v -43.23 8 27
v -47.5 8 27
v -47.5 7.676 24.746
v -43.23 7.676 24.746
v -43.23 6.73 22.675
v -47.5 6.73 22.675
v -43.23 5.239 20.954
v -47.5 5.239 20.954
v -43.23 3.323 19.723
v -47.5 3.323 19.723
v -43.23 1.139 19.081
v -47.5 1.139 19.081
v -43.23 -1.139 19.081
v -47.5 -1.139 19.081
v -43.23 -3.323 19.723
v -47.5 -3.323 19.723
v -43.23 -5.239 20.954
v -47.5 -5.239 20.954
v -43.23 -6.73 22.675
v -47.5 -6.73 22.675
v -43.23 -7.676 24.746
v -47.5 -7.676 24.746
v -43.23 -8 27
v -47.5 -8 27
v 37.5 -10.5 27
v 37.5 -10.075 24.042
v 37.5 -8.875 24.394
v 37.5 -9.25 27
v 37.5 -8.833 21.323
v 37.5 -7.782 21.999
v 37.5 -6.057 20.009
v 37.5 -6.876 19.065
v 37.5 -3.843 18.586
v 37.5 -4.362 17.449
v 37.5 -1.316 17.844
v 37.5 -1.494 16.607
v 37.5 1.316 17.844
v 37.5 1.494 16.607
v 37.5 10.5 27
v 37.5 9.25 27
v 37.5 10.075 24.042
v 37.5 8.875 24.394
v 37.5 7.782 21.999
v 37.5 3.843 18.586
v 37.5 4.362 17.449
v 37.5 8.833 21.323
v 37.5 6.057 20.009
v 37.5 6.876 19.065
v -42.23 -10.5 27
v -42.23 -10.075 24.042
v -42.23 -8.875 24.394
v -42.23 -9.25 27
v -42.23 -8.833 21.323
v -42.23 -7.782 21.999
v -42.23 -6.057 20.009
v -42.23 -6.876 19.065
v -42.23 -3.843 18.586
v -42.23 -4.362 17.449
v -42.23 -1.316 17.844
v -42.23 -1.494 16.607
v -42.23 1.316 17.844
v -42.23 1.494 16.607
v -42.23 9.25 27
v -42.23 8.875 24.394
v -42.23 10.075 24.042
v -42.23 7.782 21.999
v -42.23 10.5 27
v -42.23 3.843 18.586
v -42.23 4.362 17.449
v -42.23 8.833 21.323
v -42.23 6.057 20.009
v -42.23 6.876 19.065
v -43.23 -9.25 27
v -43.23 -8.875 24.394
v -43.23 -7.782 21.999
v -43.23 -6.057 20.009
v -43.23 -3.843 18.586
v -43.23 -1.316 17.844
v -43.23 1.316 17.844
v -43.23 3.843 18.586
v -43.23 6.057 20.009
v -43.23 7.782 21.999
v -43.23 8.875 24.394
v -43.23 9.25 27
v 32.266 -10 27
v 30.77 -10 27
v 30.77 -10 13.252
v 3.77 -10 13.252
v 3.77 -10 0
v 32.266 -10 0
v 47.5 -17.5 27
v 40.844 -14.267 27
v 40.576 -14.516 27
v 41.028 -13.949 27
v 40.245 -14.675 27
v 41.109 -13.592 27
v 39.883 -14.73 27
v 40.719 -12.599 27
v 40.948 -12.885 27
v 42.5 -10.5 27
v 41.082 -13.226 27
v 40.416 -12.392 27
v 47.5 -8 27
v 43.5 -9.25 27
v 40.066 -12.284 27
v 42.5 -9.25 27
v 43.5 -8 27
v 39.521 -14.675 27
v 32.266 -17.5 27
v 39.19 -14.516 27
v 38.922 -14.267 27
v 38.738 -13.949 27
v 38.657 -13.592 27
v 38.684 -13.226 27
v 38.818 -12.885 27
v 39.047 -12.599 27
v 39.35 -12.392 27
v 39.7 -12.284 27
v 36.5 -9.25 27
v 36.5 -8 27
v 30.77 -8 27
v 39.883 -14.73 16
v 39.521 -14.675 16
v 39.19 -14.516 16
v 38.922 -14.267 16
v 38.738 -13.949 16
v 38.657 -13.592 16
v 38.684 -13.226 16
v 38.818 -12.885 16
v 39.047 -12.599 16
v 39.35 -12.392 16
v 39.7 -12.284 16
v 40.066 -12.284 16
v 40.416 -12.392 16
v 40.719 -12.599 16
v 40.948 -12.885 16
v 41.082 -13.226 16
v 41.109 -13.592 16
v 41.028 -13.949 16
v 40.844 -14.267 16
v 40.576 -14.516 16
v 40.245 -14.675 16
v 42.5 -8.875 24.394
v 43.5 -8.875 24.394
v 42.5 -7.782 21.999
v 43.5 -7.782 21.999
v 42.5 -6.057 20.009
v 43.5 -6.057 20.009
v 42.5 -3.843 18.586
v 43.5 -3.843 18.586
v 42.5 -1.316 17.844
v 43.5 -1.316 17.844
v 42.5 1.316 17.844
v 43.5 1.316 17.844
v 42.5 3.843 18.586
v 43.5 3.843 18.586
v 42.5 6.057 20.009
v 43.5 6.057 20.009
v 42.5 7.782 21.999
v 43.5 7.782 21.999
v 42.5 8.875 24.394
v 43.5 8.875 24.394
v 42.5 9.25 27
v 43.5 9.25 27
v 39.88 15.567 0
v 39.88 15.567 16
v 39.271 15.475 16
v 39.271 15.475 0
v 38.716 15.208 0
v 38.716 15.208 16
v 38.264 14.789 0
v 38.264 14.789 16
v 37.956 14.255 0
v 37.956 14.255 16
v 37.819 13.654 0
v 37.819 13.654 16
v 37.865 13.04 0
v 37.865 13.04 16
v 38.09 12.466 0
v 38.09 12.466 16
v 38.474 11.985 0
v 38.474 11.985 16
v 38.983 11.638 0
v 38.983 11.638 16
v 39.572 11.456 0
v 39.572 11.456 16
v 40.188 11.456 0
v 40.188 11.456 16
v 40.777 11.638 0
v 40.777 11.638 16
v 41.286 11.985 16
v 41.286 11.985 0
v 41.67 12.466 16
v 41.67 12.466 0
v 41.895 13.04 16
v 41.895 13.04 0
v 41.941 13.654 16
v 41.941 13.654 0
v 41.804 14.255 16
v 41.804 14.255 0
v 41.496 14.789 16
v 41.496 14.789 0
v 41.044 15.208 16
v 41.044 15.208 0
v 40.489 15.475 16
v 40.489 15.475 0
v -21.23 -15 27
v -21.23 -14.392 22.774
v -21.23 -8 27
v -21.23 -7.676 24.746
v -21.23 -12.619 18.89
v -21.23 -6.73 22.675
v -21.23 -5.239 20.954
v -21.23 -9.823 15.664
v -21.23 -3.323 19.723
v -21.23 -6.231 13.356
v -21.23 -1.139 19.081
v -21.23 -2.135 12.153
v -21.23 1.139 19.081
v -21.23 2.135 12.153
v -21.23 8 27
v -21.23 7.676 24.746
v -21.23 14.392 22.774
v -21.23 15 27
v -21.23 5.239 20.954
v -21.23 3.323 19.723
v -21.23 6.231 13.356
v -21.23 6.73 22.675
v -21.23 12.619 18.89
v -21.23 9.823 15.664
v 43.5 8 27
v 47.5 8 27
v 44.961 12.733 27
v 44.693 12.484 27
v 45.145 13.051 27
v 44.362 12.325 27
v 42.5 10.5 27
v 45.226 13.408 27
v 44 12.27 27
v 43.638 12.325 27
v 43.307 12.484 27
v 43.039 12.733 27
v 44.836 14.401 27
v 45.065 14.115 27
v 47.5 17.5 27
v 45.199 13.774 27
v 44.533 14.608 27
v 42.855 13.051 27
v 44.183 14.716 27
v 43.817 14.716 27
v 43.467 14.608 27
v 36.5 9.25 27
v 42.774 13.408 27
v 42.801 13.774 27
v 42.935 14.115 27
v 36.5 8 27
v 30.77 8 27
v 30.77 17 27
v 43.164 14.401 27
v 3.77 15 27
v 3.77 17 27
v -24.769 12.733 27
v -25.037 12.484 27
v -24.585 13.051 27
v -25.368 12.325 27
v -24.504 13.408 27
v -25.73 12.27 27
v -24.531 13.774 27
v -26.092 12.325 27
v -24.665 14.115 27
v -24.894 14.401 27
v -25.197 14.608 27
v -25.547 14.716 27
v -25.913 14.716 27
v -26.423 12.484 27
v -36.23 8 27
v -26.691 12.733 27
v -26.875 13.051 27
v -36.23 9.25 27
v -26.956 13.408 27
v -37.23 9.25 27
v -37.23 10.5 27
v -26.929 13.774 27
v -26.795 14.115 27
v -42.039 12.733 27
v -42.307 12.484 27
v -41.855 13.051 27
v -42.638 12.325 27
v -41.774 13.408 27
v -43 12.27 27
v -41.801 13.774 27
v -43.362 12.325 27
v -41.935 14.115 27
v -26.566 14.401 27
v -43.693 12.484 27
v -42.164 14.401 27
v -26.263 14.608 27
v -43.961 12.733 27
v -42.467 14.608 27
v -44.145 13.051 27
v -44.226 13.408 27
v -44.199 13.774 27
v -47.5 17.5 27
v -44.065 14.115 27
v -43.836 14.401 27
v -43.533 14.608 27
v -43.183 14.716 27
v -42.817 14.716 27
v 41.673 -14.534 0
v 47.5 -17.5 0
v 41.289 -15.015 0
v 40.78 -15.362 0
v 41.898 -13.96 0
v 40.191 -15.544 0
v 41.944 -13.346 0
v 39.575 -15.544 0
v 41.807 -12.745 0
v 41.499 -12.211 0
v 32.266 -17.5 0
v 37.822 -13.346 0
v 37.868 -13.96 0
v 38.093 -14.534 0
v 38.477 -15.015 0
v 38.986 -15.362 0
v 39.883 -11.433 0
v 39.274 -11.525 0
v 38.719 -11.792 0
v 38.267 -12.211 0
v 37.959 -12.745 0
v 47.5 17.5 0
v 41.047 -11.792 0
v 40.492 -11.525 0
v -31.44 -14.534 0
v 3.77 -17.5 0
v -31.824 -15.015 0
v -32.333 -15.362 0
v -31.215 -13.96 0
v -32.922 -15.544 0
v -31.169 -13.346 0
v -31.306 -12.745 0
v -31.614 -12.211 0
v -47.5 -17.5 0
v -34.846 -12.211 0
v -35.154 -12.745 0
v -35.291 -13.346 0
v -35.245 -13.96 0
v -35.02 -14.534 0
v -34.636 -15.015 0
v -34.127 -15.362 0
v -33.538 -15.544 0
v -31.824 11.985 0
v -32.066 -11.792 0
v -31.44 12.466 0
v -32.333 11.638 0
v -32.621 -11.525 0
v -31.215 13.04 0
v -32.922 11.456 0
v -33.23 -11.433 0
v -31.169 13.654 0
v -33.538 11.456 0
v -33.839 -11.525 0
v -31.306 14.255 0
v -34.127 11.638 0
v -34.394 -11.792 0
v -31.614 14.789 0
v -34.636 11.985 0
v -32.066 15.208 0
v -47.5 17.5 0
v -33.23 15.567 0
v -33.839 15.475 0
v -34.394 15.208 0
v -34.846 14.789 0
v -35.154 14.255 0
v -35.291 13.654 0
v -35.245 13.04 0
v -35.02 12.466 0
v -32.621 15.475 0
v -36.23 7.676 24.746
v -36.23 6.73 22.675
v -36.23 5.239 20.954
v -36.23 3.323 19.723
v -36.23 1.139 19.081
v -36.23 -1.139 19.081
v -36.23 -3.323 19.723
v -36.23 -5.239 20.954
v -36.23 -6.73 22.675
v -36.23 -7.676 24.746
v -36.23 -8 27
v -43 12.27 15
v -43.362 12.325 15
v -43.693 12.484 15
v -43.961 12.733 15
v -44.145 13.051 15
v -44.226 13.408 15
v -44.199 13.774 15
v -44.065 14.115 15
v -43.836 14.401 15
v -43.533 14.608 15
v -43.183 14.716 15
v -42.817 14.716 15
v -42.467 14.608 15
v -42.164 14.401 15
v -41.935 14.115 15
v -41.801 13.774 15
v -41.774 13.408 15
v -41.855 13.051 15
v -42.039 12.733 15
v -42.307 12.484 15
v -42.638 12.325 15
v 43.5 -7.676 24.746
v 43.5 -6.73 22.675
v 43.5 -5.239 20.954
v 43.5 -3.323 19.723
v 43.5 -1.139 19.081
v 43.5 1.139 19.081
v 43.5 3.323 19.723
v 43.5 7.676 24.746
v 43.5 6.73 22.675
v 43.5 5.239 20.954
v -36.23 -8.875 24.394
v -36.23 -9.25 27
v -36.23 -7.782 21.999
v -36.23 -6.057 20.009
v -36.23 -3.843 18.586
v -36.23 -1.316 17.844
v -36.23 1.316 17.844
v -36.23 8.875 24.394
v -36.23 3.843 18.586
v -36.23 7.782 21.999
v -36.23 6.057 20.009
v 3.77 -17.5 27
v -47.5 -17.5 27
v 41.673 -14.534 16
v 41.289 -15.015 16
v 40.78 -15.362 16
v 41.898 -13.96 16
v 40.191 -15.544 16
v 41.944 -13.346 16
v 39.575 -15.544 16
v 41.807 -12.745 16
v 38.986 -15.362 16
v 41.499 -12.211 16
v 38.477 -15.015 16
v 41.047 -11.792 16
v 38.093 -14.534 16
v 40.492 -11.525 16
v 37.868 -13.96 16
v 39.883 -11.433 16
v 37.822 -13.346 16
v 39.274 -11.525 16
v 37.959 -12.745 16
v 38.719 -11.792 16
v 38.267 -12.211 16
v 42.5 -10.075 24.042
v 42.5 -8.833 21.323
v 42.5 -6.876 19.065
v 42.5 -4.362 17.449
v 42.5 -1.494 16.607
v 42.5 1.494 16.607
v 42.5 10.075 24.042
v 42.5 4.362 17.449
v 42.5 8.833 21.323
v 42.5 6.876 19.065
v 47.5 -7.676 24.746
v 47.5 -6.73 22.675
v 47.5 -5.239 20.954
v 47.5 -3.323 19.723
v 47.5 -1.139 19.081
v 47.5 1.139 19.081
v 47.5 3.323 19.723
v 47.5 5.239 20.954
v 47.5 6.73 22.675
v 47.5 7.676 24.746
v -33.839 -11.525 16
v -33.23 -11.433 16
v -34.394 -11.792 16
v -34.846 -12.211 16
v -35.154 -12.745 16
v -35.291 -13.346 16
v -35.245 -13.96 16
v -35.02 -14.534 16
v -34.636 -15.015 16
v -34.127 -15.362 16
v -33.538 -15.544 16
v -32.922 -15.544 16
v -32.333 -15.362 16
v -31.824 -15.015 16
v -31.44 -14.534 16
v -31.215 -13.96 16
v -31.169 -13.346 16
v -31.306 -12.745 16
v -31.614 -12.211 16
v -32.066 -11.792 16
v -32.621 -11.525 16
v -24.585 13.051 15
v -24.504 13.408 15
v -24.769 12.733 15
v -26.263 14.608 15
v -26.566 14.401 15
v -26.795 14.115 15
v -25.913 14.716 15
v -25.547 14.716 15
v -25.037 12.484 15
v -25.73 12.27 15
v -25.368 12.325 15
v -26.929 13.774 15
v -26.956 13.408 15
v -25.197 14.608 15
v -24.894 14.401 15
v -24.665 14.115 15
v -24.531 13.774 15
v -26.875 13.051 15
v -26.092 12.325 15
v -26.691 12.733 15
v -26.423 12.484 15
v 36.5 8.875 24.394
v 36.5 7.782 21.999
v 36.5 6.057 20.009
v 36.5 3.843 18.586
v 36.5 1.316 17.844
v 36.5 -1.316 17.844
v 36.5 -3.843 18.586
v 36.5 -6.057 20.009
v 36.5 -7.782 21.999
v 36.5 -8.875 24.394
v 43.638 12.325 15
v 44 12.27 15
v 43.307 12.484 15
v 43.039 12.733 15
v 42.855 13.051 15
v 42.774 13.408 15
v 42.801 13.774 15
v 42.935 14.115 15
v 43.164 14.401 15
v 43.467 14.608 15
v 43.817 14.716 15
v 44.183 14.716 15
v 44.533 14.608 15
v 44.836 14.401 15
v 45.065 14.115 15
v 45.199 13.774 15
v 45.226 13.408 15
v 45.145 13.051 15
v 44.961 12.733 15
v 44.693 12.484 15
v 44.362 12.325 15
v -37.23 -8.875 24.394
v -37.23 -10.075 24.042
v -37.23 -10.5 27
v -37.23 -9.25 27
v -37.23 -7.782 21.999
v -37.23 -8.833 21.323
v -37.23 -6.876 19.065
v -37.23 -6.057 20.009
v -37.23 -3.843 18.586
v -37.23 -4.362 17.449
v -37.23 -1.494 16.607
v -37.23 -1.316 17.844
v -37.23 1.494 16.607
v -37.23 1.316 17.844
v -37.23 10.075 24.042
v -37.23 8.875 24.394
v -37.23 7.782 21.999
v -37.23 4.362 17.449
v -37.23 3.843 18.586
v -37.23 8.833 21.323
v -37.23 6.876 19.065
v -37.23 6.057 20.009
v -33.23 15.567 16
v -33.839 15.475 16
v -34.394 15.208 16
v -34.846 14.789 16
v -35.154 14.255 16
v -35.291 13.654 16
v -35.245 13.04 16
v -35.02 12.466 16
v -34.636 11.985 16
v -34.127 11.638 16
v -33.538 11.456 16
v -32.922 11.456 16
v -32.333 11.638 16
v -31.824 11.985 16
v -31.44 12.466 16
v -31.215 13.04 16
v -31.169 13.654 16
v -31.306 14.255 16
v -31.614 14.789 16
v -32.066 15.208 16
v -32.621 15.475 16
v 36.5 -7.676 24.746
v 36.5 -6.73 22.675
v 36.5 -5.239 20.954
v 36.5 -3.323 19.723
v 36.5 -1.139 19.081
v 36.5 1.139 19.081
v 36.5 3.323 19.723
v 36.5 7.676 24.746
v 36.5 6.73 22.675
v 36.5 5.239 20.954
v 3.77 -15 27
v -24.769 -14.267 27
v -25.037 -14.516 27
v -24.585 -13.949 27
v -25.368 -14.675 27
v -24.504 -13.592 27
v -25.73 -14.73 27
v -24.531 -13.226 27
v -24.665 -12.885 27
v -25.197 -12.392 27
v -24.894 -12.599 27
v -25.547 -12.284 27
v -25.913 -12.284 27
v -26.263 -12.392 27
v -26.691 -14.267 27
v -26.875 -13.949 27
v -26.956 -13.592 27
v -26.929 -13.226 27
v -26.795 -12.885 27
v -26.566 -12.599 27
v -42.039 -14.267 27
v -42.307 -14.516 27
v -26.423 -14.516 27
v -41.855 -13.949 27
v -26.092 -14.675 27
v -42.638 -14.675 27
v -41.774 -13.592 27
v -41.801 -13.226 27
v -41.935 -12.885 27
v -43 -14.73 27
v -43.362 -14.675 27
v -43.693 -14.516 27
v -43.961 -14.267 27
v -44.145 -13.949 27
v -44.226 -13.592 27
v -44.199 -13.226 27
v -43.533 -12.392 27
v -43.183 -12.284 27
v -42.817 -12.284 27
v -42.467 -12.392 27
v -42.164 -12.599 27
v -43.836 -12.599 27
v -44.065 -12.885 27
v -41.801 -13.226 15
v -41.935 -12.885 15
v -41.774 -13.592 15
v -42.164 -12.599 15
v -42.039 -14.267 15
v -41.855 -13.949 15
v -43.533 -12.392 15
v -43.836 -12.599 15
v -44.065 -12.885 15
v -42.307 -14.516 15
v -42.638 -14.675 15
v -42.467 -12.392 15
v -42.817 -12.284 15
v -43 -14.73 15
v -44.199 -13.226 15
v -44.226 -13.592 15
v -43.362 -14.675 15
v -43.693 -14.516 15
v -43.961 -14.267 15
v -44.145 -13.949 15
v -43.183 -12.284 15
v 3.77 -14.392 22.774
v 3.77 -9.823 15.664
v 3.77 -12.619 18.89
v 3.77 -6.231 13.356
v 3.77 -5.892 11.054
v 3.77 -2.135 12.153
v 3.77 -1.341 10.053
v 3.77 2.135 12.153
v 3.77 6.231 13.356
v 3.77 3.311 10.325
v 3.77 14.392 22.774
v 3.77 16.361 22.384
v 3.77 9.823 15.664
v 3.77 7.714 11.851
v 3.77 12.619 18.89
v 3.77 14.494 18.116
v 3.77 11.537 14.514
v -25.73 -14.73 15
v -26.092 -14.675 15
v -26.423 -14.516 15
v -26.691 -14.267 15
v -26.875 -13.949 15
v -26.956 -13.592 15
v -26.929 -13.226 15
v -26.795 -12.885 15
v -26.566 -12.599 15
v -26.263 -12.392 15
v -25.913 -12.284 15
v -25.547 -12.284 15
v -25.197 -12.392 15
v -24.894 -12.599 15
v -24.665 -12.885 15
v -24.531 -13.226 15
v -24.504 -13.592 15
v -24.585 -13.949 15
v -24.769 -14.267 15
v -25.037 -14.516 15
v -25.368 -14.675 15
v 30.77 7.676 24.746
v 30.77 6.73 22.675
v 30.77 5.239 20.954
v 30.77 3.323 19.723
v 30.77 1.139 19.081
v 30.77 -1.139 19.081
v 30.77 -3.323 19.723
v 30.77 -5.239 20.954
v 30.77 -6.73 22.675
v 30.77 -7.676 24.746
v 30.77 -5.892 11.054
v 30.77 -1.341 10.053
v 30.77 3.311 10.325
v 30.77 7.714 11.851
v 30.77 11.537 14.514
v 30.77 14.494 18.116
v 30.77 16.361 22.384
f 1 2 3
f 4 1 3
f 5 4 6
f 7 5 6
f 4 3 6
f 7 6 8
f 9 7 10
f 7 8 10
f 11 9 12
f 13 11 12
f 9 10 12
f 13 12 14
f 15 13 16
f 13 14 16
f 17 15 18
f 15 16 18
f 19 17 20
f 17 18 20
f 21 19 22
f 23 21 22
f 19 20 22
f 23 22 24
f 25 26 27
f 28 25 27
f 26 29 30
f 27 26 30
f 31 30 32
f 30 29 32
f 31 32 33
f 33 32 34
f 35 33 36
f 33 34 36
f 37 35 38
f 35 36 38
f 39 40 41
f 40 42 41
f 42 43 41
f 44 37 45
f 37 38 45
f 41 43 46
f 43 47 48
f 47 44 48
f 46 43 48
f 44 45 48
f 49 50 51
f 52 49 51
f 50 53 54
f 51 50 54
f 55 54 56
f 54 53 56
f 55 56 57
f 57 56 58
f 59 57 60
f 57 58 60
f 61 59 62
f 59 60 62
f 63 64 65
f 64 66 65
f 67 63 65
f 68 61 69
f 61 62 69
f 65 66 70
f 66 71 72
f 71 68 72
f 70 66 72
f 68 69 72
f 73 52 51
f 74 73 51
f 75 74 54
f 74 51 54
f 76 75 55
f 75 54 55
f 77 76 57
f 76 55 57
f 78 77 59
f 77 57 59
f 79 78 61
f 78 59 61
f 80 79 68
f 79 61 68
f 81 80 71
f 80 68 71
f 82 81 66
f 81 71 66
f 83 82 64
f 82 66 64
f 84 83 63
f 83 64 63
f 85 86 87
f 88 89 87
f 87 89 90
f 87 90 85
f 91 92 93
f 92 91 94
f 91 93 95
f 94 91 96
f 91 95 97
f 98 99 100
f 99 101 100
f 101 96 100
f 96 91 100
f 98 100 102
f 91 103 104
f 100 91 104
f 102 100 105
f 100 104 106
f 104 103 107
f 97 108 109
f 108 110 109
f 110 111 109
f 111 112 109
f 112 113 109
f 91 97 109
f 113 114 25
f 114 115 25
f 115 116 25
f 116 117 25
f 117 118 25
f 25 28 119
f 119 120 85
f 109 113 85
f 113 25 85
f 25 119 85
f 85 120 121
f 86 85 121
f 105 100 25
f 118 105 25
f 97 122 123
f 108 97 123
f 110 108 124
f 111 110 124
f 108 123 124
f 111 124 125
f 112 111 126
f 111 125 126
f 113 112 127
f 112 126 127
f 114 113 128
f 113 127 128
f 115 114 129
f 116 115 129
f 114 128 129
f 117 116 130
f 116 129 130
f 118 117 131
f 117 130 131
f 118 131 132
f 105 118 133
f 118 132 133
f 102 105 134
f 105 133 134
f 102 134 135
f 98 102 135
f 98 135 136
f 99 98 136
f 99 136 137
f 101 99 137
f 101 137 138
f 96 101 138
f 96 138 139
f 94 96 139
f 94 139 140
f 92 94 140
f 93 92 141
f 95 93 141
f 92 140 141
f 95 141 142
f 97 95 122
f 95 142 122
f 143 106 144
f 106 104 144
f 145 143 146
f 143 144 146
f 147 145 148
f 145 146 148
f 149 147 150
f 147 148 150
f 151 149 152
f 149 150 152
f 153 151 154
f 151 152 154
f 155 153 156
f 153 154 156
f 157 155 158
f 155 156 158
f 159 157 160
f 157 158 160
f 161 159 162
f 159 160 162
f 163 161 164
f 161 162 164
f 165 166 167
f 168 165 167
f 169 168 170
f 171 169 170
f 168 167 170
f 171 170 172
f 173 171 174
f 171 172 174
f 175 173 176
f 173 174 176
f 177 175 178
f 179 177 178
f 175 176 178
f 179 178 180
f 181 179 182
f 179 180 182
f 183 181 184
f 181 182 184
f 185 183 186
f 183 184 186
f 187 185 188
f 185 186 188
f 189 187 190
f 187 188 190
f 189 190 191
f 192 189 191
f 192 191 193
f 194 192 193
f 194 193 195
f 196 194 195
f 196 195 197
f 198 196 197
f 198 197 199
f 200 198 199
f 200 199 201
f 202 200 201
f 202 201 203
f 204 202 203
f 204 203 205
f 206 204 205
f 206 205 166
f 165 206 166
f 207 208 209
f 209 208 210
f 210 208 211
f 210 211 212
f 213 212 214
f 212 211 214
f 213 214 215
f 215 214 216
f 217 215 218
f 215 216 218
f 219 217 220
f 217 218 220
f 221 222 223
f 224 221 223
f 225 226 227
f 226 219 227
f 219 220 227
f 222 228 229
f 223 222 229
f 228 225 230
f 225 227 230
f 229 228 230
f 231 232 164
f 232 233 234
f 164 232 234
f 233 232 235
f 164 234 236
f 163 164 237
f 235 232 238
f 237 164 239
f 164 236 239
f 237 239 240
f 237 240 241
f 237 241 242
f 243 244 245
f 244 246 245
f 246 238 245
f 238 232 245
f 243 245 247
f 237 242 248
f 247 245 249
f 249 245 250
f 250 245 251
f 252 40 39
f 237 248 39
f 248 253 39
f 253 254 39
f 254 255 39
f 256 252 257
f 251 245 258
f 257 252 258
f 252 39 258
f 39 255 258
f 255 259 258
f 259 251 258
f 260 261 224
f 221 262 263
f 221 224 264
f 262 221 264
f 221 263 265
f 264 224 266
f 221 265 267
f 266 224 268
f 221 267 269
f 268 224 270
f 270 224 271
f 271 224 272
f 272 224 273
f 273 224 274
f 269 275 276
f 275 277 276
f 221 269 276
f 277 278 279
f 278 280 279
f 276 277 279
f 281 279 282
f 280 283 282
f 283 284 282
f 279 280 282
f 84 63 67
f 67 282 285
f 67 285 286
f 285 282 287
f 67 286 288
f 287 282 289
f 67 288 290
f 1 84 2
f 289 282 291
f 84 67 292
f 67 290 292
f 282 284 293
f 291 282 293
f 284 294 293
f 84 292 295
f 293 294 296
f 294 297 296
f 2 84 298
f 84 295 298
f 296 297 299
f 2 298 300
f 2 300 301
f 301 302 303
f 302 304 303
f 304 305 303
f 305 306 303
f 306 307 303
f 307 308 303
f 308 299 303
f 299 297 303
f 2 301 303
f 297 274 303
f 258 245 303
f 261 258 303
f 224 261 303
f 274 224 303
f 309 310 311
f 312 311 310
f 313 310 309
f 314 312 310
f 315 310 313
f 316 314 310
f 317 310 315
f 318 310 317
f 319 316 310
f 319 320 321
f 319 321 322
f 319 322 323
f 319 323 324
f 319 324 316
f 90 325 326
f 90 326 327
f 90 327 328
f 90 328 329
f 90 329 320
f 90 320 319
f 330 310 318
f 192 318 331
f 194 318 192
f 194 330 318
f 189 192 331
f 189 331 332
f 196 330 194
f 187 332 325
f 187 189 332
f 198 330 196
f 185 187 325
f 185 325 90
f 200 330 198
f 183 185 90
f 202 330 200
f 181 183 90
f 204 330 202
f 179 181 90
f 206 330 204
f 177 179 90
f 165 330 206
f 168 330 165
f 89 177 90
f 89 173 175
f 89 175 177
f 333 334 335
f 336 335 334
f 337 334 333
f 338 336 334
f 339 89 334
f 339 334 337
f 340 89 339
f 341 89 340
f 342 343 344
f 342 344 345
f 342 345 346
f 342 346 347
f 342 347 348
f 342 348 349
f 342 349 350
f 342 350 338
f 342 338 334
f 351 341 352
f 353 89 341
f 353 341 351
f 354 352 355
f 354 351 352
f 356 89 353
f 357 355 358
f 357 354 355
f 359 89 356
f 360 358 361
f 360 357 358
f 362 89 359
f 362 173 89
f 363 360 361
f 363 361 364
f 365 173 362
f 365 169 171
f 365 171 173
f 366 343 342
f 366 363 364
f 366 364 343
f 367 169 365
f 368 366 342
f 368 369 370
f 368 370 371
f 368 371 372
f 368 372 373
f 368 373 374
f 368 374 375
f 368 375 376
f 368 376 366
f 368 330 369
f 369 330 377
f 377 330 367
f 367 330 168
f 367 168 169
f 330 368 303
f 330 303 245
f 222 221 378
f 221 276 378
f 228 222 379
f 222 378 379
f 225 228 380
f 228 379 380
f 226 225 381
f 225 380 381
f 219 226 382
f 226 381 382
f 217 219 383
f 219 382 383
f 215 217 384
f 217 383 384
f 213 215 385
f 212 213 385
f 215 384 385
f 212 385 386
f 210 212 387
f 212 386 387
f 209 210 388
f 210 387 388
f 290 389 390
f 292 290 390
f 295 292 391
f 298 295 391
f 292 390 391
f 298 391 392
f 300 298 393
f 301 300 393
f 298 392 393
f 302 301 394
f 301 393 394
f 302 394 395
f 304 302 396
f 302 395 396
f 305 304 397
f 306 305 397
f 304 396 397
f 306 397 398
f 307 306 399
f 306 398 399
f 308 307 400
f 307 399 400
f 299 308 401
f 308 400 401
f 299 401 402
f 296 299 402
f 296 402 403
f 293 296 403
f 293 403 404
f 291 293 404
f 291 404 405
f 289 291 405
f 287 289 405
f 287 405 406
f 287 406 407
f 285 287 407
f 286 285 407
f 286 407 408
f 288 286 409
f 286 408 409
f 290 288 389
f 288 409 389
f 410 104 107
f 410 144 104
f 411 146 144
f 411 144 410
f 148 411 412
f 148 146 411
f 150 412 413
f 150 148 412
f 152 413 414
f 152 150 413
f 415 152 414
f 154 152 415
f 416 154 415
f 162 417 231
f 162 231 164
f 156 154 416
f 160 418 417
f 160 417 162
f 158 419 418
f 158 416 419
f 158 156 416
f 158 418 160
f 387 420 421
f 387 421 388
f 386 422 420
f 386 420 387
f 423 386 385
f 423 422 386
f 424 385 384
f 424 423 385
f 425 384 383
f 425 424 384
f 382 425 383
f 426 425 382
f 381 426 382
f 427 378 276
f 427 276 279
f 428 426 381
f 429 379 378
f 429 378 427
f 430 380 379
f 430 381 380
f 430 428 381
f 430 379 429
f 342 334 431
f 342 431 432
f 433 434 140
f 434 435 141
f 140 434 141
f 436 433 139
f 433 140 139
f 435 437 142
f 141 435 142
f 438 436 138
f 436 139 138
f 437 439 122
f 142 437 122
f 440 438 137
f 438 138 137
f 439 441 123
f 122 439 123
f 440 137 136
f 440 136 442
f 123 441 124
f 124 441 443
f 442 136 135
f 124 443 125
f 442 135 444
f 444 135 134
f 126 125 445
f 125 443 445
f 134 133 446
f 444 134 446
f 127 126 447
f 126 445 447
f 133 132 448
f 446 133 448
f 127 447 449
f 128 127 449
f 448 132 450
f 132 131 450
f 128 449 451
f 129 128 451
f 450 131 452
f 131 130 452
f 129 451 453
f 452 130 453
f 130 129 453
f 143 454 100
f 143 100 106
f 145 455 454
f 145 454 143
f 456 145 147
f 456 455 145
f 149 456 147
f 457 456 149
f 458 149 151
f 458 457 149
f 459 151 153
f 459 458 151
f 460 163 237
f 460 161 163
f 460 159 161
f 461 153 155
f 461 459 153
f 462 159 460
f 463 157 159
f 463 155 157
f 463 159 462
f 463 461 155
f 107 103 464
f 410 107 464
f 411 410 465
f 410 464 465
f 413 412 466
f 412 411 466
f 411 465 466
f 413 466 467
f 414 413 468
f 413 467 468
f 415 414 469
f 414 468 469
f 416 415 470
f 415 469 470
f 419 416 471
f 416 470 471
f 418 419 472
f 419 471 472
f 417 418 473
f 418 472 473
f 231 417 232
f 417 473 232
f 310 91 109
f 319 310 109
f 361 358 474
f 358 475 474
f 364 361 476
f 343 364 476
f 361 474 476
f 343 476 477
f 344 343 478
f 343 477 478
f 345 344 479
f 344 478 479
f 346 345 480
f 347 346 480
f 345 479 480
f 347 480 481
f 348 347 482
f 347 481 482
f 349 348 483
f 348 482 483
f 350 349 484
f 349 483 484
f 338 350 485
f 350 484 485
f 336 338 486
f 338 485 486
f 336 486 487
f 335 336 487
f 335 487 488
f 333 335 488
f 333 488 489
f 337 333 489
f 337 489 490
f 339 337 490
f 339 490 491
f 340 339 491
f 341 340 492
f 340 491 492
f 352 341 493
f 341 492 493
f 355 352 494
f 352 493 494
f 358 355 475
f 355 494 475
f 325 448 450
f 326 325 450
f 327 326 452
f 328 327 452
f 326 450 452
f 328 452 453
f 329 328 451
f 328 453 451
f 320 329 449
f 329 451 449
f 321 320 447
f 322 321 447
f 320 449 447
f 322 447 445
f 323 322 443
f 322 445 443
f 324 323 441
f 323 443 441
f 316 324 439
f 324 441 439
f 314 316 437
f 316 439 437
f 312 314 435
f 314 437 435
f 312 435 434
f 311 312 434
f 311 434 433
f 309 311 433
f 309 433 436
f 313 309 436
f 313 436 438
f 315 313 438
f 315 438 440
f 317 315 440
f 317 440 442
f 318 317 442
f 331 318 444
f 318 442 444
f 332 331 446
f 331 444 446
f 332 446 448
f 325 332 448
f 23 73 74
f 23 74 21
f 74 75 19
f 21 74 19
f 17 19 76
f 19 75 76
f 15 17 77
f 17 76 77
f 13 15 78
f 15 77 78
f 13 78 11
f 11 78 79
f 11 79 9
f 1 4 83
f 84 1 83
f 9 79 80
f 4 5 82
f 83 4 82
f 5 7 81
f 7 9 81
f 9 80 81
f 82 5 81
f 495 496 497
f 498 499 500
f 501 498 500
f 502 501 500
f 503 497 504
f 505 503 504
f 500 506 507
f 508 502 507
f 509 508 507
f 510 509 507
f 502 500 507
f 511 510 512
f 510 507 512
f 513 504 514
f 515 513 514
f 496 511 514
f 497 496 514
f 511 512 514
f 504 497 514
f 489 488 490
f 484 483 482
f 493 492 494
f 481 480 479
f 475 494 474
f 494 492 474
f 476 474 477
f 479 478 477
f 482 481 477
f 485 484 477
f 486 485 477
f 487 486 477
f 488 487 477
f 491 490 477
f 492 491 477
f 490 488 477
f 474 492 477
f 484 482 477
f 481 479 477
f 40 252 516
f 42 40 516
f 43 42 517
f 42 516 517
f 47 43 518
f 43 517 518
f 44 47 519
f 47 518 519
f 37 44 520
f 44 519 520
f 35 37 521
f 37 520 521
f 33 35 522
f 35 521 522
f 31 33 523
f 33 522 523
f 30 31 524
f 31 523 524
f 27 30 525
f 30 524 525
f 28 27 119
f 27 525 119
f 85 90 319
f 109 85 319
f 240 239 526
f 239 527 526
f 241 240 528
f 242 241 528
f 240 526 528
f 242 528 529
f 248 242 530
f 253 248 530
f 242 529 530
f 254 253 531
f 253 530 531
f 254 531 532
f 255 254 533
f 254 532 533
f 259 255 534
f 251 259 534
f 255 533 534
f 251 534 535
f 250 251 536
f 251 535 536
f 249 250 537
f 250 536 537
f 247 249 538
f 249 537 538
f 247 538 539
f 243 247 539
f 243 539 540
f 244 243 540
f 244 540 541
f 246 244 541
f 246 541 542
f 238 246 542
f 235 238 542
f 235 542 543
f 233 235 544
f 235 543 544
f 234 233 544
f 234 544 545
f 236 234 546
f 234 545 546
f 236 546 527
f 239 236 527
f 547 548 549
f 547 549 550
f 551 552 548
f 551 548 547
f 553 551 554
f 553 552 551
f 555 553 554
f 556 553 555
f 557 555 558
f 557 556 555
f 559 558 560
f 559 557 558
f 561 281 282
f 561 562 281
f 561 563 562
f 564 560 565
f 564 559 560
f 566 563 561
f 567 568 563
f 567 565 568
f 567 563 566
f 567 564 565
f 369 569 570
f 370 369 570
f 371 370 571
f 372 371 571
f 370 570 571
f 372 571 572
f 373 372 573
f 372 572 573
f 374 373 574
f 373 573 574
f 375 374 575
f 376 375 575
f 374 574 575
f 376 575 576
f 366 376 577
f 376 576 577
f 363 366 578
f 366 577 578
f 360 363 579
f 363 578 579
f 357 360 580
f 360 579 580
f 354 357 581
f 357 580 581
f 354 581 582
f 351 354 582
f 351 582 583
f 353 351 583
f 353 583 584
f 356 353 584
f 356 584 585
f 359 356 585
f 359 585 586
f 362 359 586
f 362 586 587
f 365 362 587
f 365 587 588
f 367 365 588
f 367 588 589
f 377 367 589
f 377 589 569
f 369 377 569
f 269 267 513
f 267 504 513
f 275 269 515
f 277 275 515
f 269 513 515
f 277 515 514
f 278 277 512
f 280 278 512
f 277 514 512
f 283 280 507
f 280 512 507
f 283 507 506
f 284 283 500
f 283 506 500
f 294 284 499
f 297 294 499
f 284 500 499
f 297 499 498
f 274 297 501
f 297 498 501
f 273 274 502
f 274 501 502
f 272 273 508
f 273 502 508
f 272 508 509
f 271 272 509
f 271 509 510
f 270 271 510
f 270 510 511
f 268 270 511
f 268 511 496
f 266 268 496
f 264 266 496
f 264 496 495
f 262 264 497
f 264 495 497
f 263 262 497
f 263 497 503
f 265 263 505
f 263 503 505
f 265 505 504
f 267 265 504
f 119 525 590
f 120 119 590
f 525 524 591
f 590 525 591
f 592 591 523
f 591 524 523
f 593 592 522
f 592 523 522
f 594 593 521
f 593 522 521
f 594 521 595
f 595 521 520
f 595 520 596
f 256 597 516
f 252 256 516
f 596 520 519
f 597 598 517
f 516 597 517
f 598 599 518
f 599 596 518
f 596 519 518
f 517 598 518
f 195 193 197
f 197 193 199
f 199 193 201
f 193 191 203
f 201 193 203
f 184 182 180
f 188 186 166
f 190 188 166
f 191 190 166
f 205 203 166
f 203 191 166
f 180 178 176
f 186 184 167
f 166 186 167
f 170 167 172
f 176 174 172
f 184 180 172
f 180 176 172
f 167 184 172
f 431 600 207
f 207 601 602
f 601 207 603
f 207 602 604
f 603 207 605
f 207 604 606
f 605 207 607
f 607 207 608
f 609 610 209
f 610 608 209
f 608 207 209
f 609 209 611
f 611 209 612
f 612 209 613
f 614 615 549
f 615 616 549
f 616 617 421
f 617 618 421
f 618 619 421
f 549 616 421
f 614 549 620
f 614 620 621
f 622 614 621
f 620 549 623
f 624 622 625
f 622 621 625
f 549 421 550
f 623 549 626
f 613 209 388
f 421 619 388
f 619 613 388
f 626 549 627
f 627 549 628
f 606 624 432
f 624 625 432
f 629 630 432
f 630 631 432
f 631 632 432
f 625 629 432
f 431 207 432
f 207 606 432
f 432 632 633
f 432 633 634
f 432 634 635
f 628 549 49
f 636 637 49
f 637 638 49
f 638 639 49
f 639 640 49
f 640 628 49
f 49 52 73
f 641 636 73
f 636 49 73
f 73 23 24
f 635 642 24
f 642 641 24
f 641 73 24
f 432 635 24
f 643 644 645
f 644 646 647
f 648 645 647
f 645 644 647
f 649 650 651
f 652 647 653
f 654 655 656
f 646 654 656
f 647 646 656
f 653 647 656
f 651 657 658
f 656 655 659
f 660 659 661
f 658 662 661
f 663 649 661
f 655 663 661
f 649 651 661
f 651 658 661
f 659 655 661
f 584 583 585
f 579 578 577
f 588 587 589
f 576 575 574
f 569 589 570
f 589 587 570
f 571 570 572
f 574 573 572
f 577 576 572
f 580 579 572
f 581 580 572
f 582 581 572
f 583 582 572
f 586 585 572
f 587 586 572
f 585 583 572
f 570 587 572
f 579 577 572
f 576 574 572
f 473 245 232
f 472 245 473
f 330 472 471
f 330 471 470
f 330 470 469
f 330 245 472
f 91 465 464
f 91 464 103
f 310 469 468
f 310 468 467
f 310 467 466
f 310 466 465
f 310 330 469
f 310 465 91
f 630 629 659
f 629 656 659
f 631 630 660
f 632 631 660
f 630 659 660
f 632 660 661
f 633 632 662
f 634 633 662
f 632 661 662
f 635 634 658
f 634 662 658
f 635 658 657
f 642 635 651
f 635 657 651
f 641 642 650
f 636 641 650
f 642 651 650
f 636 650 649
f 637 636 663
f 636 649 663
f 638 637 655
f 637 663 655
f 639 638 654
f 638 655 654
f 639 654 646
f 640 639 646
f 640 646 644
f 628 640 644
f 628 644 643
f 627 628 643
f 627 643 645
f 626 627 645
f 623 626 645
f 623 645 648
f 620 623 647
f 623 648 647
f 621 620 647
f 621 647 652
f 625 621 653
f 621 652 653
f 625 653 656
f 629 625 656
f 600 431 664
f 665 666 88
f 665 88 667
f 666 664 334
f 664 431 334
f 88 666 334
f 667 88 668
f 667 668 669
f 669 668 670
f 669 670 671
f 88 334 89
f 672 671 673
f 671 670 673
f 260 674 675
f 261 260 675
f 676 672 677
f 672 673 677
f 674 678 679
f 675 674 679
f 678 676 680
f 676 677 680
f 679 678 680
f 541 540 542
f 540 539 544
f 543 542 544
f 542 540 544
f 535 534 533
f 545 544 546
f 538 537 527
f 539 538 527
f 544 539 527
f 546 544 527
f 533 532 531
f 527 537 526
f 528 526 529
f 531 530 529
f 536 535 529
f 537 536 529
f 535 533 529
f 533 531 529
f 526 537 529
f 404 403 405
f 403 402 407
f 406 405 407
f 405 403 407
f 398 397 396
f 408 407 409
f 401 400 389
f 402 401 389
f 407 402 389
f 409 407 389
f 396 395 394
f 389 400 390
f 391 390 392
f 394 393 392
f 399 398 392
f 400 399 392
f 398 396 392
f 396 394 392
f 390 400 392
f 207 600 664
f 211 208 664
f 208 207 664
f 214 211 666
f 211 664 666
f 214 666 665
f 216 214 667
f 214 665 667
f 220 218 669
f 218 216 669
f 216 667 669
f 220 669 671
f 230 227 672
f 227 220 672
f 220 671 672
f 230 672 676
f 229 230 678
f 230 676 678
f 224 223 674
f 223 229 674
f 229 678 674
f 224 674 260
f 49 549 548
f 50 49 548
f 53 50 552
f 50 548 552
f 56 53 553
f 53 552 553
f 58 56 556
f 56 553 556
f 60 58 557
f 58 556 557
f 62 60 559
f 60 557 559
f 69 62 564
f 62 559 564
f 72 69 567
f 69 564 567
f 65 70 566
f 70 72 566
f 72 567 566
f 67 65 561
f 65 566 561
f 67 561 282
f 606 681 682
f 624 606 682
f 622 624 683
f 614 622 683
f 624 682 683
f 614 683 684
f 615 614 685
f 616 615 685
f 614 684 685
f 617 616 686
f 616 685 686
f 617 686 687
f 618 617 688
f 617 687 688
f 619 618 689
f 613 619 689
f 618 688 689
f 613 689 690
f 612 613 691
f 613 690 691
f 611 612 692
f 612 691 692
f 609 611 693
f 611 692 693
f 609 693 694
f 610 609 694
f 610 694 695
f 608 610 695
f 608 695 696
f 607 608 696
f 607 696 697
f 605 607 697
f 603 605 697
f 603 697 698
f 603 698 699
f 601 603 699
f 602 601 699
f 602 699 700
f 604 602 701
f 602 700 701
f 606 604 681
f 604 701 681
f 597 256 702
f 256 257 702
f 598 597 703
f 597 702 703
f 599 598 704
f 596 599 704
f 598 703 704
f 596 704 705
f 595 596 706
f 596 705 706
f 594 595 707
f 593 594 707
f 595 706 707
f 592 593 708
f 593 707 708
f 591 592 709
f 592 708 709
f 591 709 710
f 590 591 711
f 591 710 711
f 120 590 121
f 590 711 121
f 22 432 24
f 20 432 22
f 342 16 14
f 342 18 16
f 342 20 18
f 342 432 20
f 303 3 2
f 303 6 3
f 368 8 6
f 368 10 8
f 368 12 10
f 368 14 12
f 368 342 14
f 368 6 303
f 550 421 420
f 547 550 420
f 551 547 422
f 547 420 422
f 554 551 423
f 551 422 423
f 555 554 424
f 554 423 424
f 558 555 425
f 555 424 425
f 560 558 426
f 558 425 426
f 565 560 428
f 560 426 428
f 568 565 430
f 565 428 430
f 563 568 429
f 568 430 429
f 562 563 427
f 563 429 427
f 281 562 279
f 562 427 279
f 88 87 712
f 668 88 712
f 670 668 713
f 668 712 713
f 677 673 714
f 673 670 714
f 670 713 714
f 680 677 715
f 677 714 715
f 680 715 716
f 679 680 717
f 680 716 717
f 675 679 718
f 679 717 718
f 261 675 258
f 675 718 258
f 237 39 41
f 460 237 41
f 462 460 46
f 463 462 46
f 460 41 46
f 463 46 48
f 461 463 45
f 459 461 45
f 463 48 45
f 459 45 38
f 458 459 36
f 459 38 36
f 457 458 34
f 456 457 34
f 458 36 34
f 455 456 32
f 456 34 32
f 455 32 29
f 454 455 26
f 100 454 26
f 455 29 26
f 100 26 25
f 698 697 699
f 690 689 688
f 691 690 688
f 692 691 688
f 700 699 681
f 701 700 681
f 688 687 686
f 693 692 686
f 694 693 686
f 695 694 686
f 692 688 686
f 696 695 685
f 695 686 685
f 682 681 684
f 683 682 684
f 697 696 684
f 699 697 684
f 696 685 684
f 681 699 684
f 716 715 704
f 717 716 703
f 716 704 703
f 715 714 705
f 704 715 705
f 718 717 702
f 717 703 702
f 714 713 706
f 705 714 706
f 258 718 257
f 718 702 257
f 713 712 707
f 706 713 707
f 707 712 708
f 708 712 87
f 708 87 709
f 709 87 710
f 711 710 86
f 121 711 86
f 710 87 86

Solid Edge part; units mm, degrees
sketch "Sketch1" plane through (0, 0, 0) normal (0, 0, 1) x (1, 0, 0)
  line L0 (47.5, -17.5) -> (-47.5, -17.5)
  line L1 (-47.5, -17.5) -> (-47.5, 17.5)
  line L2 (-47.5, 17.5) -> (47.5, 17.5)
  line L3 (47.5, 17.5) -> (47.5, -17.5)
  dimension "D1" = 95
  dimension "D2" = 35
extrude "Protrusion1" add sketch "Sketch1" along normal blind 27
sketch "Sketch2" plane through (0, 0, 27) normal (0, 0, 1) x (1, 0, 0)
  line L0 (3.77, 15) -> (3.77, 17)
  line L1 (3.77, 17) -> (30.77, 17)
  line L2 (30.77, 17) -> (30.77, 8)
  line L3 (36.5, 8) -> (30.77, 8)
  line L4 (36.5, 9.25) -> (36.5, 8)
  line L5 (37.5, 9.25) -> (36.5, 9.25)
  line L6 (37.5, 10.5) -> (37.5, 9.25)
  line L7 (42.5, 10.5) -> (37.5, 10.5)
  line L8 (42.5, 9.25) -> (42.5, 10.5)
  line L9 (42.5, 9.25) -> (43.5, 9.25)
  line L10 (43.5, 9.25) -> (43.5, 8)
  line L11 (43.5, 8) -> (47.5, 8)
  line L12 (47.5, 8) -> (47.5, 0)
  line L13 (-47.5, 0) -> (-47.5, 8)
  line L14 (-43.23, 8) -> (-47.5, 8)
  line L15 (-43.23, 8) -> (-43.23, 9.25)
  line L16 (-43.23, 9.25) -> (-42.23, 9.25)
  line L17 (-42.23, 9.25) -> (-42.23, 10.5)
  line L18 (-42.23, 10.5) -> (-37.23, 10.5)
  line L19 (-37.23, 10.5) -> (-37.23, 9.25)
  line L20 (-37.23, 9.25) -> (-36.23, 9.25)
  line L21 (-36.23, 9.25) -> (-36.23, 8)
  line L22 (-21.23, 8) -> (-36.23, 8)
  line L23 (-21.23, 8) -> (-21.23, 15)
  line L24 (-21.23, 15) -> (3.77, 15)
  dimension "D1" = 5
  dimension "D2" = 5
  dimension "D3" = 1
  dimension "D4" = 1
  dimension "D5" = 1
  dimension "D6" = 1
  dimension "D7" = 5
  dimension "D8" = 84.73
  dimension "D9" = 15
  dimension "D10" = 25
  dimension "D11" = 27
revolve "RevolvedCutout1" cut sketch "Sketch2" angle 360 about axis through (47.5, 0, 27) along (-1, 0, 0)
sketch "Sketch3" plane through (0, -17.5, 13.5) normal (0, -1, 0) x (1, 0, 0)
  line L0 (3.77, 5) -> (30.77, 5)
  line L1 (30.77, 5) -> (30.77, 13.5)
  line L2 (30.77, 13.5) -> (3.77, 13.5)
  line L3 (3.77, 13.5) -> (3.77, 5)
extrude "Extrusionsausschnitt_1" cut sketch "Sketch3" against normal blind 7.5
sketch "Sketch4" plane through (17.27, -16.1112, 18.5) normal (0, 0, 1) x (1, 0, 0)
  line L0 (-13.5, 6.1112) -> (13.5, 6.1112)
  line L1 (-13.5, -1.3888) -> (-13.5, 6.1112)
  line L2 (13.5, -1.3888) -> (-13.5, -1.3888)
  line L3 (14.996, -1.3888) -> (13.5, -1.3888)
  line L4 (14.996, 6.1112) -> (14.996, -1.3888)
  line L5 (13.5, 6.1112) -> (14.996, 6.1112)
  dimension "D1" = 7.5
  dimension "D2" = 1.496
extrude "Extrusionsausschnitt_2" cut sketch "Sketch4" along normal mid plane 100
hole "Bohrung_1" at (-25.73, 13.5, 27) direction (0, 0, -1) diameter 2.459 depth 12
hole "Hole1" at (39.883, -13.5, 27) direction (0, 0, -1) diameter 2.459 depth 12
hole "Hole2" at (-25.73, -13.5, 27) direction (0, 0, -1) diameter 2.459 depth 12
hole "Hole3" at (-43, -13.5, 27) direction (0, 0, -1) diameter 2.459 depth 12
hole "Hole4" at (-43, 13.5, 27) direction (0, 0, -1) diameter 2.459 depth 12
hole "Hole5" at (44, 13.5, 27) direction (0, 0, -1) diameter 2.459 depth 12
hole "Bohrung_8" at (-33.23, -13.5, 0) direction (0, 0, 1) diameter 4.134 depth 16
hole "Hole6" at (39.88, 13.5, 0) direction (0, 0, 1) diameter 4.134 depth 16
hole "Hole7" at (39.883, -13.5, 0) direction (0, 0, 1) diameter 4.134 depth 16
hole "Hole8" at (-33.23, 13.5, 0) direction (0, 0, 1) diameter 4.134 depth 16
properties part number "32" material "Polykarbonat"
